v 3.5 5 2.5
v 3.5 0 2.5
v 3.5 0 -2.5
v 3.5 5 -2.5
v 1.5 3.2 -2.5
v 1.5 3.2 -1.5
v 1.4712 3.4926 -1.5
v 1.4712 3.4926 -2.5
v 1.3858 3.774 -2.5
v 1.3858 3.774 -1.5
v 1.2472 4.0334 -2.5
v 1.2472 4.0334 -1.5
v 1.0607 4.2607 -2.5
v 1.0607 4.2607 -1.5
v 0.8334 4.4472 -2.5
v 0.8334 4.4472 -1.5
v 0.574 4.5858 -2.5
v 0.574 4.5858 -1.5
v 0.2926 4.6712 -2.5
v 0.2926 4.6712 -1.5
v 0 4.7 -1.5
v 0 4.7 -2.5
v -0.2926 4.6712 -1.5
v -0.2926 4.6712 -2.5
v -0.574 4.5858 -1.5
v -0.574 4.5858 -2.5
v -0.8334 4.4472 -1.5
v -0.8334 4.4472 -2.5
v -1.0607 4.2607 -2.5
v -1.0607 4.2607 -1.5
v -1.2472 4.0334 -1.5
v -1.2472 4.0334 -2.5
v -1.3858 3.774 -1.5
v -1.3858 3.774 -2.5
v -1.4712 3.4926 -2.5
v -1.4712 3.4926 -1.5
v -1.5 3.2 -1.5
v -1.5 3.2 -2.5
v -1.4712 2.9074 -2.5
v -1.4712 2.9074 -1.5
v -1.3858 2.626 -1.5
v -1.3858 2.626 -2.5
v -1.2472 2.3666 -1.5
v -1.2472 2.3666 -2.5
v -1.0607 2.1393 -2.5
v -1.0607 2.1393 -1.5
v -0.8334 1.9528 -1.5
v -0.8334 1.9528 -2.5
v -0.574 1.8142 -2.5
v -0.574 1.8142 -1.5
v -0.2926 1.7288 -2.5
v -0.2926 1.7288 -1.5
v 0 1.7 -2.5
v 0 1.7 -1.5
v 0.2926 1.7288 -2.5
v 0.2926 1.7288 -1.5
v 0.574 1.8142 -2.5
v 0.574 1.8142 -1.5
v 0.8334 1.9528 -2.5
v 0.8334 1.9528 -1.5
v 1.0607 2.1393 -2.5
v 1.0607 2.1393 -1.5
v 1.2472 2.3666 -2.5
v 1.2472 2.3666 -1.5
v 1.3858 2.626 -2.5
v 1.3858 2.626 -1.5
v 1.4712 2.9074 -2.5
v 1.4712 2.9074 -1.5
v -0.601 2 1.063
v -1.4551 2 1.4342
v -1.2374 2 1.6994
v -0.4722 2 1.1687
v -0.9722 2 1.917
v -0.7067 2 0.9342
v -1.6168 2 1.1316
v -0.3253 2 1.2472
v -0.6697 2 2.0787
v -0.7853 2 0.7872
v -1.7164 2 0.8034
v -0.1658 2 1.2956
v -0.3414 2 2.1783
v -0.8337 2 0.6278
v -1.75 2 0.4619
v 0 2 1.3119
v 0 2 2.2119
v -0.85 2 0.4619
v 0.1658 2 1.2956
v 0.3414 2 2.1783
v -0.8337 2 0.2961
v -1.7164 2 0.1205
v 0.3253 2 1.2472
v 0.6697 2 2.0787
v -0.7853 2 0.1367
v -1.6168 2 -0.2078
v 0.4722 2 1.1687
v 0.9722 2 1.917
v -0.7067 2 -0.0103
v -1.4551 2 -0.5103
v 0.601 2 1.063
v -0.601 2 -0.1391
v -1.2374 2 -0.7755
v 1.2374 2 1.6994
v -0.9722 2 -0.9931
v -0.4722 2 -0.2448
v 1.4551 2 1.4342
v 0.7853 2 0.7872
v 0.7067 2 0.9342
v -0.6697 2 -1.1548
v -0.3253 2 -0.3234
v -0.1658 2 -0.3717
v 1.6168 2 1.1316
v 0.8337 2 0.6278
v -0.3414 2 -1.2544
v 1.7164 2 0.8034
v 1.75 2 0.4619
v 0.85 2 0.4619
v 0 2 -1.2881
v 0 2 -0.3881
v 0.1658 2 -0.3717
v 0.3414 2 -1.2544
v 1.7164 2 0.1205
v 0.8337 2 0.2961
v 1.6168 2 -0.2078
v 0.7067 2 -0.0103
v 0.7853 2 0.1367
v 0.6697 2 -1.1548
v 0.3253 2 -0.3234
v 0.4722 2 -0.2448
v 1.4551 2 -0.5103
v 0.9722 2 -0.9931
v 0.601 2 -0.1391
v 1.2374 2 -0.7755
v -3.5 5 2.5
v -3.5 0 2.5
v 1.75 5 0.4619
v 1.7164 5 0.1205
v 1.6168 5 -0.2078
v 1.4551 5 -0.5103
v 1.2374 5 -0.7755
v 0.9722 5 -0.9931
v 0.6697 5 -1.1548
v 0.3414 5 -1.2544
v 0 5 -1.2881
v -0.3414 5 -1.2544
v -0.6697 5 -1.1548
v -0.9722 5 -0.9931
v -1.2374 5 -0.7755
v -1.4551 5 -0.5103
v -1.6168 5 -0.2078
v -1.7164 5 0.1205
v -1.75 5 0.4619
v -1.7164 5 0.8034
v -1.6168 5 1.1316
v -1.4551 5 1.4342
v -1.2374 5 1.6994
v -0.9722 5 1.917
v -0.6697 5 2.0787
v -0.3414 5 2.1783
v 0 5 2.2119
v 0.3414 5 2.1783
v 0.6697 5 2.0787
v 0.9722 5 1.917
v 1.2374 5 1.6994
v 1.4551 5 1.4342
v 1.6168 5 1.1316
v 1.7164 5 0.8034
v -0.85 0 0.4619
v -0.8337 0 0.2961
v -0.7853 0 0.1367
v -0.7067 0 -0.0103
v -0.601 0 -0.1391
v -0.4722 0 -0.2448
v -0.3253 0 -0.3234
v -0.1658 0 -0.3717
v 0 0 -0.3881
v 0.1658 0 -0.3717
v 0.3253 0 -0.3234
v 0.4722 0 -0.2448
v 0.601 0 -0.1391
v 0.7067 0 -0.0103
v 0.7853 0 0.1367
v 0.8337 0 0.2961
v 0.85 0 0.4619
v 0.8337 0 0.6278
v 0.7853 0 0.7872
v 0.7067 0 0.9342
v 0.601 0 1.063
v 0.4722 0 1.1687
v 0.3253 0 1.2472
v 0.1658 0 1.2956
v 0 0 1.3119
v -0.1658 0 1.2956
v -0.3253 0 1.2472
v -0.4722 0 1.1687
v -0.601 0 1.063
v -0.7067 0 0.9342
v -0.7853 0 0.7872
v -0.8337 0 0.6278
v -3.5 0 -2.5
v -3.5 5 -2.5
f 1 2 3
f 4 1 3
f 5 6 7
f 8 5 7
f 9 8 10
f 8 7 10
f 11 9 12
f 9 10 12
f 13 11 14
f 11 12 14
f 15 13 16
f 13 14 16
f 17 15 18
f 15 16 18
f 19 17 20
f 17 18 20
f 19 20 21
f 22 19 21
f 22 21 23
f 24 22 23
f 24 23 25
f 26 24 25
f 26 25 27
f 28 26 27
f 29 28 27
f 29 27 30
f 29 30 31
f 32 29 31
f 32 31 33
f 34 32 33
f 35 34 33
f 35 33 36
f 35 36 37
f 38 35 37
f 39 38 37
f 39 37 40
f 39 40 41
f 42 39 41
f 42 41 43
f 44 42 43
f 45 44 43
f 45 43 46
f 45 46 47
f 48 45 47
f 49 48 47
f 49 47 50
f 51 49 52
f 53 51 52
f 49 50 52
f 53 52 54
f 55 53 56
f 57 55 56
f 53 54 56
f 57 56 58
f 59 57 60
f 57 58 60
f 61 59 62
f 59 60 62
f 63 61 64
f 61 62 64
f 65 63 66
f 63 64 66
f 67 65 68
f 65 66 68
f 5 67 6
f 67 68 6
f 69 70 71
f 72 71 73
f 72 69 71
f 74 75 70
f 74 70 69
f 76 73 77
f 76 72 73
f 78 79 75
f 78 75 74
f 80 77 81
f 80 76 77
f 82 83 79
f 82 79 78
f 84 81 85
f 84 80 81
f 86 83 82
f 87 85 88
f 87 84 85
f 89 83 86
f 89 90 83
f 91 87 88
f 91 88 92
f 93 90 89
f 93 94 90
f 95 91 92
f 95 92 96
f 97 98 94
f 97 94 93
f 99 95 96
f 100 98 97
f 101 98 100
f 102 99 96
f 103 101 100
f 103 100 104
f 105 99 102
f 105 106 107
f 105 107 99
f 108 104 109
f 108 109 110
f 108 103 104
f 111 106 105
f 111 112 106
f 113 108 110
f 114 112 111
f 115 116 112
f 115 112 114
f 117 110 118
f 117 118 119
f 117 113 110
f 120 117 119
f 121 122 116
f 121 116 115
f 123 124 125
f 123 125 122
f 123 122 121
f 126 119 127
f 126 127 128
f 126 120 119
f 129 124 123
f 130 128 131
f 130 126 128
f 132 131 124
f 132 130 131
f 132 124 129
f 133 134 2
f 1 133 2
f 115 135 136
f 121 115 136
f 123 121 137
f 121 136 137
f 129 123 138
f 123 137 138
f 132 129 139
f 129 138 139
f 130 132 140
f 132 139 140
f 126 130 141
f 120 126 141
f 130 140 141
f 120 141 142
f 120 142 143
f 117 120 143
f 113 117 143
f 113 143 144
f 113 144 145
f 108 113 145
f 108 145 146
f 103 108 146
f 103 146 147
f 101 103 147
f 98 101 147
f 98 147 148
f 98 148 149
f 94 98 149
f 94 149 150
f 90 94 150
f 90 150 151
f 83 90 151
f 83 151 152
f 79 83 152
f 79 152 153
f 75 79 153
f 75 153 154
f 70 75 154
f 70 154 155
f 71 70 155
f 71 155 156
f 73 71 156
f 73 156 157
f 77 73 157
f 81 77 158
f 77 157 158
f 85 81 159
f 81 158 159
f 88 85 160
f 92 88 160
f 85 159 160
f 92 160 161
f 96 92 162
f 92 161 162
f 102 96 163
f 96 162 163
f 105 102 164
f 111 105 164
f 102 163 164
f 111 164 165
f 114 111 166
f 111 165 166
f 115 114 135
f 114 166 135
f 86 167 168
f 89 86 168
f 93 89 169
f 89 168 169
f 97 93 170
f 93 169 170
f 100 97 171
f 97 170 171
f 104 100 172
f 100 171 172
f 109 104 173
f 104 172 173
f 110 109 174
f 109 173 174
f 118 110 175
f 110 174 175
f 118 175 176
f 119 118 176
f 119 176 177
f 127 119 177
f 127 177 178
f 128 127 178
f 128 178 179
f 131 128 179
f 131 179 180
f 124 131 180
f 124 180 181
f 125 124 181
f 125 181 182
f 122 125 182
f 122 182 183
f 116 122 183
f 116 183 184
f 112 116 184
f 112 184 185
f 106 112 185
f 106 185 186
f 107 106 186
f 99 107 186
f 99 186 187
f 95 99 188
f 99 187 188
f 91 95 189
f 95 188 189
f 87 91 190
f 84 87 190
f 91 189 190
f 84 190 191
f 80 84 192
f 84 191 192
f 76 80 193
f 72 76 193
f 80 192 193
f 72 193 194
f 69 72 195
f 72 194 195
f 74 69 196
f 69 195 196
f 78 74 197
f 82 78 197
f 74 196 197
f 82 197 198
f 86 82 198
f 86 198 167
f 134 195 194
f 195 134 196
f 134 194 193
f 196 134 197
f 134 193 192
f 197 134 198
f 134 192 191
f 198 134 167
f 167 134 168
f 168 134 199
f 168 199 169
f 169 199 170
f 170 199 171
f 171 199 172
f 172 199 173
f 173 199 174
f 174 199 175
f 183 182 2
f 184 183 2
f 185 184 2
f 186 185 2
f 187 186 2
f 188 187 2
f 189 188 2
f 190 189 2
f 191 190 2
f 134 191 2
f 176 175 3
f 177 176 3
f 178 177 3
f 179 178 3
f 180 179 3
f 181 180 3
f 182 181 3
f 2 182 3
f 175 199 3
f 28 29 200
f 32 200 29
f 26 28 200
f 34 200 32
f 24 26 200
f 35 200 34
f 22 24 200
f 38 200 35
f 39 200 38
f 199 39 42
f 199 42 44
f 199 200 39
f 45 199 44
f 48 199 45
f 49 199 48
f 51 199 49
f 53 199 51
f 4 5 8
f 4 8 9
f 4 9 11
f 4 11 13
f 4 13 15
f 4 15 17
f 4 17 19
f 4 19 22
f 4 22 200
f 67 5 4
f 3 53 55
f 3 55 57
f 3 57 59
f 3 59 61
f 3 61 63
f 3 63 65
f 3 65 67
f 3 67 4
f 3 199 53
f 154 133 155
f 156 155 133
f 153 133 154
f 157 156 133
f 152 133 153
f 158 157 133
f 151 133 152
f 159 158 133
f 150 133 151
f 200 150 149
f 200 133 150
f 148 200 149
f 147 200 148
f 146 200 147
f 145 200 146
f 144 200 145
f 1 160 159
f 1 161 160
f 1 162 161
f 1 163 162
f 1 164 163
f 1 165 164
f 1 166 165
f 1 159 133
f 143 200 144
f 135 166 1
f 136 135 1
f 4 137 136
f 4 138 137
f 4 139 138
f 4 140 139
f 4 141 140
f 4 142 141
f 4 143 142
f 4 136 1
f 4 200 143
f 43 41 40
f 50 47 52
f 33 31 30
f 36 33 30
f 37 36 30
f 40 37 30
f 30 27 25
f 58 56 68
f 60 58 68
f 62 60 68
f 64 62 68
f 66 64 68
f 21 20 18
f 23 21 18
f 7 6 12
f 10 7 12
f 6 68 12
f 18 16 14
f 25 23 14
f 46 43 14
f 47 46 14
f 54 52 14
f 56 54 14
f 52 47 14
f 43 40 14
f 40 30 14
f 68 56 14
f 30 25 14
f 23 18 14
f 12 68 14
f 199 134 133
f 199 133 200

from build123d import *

# Parameters (mm, degrees)
SKETCH1_W                        = 7
SKETCH1_H                        = 5
BOSS_EXTRUDE1_DEPTH              = 5
F_3_0MM_DOWEL_HOLE1_D            = 3
F_3_0MM_DOWEL_HOLE1_DEPTH        = 1
CBORE_FOR_M1_6_SHCS1_D           = 1.7
CBORE_FOR_M1_6_SHCS1_DEPTH       = 5
CBORE_FOR_M1_6_SHCS1_CBORE_D     = 3.5
CBORE_FOR_M1_6_SHCS1_CBORE_DEPTH = 3


with BuildPart() as part:
    # Sketch1 → Boss-Extrude1 (new body)
    with BuildSketch(Plane(origin=(0, 0, 0), x_dir=(1, 0, 0), z_dir=(0, 1, 0))):
        Rectangle(SKETCH1_W, SKETCH1_H)
    extrude(amount=BOSS_EXTRUDE1_DEPTH)

    # Ø3.0mm Dowel Hole1
    with Locations(Plane(origin=(0, 0, -2.5), x_dir=(-1, 0, 0), z_dir=(0, 0, -1))):
        with Locations((0, 3.2)):
            Hole(F_3_0MM_DOWEL_HOLE1_D / 2, depth=F_3_0MM_DOWEL_HOLE1_DEPTH)

    # CBORE for M1.6 SHCS1
    with Locations(Plane(origin=(0, 5, 0), x_dir=(1, 0, 0), z_dir=(0, 1, 0))):
        with Locations((0, -0.461945314)):
            CounterBoreHole(CBORE_FOR_M1_6_SHCS1_D / 2, CBORE_FOR_M1_6_SHCS1_CBORE_D / 2, CBORE_FOR_M1_6_SHCS1_CBORE_DEPTH, depth=CBORE_FOR_M1_6_SHCS1_DEPTH)


solid = part.part
